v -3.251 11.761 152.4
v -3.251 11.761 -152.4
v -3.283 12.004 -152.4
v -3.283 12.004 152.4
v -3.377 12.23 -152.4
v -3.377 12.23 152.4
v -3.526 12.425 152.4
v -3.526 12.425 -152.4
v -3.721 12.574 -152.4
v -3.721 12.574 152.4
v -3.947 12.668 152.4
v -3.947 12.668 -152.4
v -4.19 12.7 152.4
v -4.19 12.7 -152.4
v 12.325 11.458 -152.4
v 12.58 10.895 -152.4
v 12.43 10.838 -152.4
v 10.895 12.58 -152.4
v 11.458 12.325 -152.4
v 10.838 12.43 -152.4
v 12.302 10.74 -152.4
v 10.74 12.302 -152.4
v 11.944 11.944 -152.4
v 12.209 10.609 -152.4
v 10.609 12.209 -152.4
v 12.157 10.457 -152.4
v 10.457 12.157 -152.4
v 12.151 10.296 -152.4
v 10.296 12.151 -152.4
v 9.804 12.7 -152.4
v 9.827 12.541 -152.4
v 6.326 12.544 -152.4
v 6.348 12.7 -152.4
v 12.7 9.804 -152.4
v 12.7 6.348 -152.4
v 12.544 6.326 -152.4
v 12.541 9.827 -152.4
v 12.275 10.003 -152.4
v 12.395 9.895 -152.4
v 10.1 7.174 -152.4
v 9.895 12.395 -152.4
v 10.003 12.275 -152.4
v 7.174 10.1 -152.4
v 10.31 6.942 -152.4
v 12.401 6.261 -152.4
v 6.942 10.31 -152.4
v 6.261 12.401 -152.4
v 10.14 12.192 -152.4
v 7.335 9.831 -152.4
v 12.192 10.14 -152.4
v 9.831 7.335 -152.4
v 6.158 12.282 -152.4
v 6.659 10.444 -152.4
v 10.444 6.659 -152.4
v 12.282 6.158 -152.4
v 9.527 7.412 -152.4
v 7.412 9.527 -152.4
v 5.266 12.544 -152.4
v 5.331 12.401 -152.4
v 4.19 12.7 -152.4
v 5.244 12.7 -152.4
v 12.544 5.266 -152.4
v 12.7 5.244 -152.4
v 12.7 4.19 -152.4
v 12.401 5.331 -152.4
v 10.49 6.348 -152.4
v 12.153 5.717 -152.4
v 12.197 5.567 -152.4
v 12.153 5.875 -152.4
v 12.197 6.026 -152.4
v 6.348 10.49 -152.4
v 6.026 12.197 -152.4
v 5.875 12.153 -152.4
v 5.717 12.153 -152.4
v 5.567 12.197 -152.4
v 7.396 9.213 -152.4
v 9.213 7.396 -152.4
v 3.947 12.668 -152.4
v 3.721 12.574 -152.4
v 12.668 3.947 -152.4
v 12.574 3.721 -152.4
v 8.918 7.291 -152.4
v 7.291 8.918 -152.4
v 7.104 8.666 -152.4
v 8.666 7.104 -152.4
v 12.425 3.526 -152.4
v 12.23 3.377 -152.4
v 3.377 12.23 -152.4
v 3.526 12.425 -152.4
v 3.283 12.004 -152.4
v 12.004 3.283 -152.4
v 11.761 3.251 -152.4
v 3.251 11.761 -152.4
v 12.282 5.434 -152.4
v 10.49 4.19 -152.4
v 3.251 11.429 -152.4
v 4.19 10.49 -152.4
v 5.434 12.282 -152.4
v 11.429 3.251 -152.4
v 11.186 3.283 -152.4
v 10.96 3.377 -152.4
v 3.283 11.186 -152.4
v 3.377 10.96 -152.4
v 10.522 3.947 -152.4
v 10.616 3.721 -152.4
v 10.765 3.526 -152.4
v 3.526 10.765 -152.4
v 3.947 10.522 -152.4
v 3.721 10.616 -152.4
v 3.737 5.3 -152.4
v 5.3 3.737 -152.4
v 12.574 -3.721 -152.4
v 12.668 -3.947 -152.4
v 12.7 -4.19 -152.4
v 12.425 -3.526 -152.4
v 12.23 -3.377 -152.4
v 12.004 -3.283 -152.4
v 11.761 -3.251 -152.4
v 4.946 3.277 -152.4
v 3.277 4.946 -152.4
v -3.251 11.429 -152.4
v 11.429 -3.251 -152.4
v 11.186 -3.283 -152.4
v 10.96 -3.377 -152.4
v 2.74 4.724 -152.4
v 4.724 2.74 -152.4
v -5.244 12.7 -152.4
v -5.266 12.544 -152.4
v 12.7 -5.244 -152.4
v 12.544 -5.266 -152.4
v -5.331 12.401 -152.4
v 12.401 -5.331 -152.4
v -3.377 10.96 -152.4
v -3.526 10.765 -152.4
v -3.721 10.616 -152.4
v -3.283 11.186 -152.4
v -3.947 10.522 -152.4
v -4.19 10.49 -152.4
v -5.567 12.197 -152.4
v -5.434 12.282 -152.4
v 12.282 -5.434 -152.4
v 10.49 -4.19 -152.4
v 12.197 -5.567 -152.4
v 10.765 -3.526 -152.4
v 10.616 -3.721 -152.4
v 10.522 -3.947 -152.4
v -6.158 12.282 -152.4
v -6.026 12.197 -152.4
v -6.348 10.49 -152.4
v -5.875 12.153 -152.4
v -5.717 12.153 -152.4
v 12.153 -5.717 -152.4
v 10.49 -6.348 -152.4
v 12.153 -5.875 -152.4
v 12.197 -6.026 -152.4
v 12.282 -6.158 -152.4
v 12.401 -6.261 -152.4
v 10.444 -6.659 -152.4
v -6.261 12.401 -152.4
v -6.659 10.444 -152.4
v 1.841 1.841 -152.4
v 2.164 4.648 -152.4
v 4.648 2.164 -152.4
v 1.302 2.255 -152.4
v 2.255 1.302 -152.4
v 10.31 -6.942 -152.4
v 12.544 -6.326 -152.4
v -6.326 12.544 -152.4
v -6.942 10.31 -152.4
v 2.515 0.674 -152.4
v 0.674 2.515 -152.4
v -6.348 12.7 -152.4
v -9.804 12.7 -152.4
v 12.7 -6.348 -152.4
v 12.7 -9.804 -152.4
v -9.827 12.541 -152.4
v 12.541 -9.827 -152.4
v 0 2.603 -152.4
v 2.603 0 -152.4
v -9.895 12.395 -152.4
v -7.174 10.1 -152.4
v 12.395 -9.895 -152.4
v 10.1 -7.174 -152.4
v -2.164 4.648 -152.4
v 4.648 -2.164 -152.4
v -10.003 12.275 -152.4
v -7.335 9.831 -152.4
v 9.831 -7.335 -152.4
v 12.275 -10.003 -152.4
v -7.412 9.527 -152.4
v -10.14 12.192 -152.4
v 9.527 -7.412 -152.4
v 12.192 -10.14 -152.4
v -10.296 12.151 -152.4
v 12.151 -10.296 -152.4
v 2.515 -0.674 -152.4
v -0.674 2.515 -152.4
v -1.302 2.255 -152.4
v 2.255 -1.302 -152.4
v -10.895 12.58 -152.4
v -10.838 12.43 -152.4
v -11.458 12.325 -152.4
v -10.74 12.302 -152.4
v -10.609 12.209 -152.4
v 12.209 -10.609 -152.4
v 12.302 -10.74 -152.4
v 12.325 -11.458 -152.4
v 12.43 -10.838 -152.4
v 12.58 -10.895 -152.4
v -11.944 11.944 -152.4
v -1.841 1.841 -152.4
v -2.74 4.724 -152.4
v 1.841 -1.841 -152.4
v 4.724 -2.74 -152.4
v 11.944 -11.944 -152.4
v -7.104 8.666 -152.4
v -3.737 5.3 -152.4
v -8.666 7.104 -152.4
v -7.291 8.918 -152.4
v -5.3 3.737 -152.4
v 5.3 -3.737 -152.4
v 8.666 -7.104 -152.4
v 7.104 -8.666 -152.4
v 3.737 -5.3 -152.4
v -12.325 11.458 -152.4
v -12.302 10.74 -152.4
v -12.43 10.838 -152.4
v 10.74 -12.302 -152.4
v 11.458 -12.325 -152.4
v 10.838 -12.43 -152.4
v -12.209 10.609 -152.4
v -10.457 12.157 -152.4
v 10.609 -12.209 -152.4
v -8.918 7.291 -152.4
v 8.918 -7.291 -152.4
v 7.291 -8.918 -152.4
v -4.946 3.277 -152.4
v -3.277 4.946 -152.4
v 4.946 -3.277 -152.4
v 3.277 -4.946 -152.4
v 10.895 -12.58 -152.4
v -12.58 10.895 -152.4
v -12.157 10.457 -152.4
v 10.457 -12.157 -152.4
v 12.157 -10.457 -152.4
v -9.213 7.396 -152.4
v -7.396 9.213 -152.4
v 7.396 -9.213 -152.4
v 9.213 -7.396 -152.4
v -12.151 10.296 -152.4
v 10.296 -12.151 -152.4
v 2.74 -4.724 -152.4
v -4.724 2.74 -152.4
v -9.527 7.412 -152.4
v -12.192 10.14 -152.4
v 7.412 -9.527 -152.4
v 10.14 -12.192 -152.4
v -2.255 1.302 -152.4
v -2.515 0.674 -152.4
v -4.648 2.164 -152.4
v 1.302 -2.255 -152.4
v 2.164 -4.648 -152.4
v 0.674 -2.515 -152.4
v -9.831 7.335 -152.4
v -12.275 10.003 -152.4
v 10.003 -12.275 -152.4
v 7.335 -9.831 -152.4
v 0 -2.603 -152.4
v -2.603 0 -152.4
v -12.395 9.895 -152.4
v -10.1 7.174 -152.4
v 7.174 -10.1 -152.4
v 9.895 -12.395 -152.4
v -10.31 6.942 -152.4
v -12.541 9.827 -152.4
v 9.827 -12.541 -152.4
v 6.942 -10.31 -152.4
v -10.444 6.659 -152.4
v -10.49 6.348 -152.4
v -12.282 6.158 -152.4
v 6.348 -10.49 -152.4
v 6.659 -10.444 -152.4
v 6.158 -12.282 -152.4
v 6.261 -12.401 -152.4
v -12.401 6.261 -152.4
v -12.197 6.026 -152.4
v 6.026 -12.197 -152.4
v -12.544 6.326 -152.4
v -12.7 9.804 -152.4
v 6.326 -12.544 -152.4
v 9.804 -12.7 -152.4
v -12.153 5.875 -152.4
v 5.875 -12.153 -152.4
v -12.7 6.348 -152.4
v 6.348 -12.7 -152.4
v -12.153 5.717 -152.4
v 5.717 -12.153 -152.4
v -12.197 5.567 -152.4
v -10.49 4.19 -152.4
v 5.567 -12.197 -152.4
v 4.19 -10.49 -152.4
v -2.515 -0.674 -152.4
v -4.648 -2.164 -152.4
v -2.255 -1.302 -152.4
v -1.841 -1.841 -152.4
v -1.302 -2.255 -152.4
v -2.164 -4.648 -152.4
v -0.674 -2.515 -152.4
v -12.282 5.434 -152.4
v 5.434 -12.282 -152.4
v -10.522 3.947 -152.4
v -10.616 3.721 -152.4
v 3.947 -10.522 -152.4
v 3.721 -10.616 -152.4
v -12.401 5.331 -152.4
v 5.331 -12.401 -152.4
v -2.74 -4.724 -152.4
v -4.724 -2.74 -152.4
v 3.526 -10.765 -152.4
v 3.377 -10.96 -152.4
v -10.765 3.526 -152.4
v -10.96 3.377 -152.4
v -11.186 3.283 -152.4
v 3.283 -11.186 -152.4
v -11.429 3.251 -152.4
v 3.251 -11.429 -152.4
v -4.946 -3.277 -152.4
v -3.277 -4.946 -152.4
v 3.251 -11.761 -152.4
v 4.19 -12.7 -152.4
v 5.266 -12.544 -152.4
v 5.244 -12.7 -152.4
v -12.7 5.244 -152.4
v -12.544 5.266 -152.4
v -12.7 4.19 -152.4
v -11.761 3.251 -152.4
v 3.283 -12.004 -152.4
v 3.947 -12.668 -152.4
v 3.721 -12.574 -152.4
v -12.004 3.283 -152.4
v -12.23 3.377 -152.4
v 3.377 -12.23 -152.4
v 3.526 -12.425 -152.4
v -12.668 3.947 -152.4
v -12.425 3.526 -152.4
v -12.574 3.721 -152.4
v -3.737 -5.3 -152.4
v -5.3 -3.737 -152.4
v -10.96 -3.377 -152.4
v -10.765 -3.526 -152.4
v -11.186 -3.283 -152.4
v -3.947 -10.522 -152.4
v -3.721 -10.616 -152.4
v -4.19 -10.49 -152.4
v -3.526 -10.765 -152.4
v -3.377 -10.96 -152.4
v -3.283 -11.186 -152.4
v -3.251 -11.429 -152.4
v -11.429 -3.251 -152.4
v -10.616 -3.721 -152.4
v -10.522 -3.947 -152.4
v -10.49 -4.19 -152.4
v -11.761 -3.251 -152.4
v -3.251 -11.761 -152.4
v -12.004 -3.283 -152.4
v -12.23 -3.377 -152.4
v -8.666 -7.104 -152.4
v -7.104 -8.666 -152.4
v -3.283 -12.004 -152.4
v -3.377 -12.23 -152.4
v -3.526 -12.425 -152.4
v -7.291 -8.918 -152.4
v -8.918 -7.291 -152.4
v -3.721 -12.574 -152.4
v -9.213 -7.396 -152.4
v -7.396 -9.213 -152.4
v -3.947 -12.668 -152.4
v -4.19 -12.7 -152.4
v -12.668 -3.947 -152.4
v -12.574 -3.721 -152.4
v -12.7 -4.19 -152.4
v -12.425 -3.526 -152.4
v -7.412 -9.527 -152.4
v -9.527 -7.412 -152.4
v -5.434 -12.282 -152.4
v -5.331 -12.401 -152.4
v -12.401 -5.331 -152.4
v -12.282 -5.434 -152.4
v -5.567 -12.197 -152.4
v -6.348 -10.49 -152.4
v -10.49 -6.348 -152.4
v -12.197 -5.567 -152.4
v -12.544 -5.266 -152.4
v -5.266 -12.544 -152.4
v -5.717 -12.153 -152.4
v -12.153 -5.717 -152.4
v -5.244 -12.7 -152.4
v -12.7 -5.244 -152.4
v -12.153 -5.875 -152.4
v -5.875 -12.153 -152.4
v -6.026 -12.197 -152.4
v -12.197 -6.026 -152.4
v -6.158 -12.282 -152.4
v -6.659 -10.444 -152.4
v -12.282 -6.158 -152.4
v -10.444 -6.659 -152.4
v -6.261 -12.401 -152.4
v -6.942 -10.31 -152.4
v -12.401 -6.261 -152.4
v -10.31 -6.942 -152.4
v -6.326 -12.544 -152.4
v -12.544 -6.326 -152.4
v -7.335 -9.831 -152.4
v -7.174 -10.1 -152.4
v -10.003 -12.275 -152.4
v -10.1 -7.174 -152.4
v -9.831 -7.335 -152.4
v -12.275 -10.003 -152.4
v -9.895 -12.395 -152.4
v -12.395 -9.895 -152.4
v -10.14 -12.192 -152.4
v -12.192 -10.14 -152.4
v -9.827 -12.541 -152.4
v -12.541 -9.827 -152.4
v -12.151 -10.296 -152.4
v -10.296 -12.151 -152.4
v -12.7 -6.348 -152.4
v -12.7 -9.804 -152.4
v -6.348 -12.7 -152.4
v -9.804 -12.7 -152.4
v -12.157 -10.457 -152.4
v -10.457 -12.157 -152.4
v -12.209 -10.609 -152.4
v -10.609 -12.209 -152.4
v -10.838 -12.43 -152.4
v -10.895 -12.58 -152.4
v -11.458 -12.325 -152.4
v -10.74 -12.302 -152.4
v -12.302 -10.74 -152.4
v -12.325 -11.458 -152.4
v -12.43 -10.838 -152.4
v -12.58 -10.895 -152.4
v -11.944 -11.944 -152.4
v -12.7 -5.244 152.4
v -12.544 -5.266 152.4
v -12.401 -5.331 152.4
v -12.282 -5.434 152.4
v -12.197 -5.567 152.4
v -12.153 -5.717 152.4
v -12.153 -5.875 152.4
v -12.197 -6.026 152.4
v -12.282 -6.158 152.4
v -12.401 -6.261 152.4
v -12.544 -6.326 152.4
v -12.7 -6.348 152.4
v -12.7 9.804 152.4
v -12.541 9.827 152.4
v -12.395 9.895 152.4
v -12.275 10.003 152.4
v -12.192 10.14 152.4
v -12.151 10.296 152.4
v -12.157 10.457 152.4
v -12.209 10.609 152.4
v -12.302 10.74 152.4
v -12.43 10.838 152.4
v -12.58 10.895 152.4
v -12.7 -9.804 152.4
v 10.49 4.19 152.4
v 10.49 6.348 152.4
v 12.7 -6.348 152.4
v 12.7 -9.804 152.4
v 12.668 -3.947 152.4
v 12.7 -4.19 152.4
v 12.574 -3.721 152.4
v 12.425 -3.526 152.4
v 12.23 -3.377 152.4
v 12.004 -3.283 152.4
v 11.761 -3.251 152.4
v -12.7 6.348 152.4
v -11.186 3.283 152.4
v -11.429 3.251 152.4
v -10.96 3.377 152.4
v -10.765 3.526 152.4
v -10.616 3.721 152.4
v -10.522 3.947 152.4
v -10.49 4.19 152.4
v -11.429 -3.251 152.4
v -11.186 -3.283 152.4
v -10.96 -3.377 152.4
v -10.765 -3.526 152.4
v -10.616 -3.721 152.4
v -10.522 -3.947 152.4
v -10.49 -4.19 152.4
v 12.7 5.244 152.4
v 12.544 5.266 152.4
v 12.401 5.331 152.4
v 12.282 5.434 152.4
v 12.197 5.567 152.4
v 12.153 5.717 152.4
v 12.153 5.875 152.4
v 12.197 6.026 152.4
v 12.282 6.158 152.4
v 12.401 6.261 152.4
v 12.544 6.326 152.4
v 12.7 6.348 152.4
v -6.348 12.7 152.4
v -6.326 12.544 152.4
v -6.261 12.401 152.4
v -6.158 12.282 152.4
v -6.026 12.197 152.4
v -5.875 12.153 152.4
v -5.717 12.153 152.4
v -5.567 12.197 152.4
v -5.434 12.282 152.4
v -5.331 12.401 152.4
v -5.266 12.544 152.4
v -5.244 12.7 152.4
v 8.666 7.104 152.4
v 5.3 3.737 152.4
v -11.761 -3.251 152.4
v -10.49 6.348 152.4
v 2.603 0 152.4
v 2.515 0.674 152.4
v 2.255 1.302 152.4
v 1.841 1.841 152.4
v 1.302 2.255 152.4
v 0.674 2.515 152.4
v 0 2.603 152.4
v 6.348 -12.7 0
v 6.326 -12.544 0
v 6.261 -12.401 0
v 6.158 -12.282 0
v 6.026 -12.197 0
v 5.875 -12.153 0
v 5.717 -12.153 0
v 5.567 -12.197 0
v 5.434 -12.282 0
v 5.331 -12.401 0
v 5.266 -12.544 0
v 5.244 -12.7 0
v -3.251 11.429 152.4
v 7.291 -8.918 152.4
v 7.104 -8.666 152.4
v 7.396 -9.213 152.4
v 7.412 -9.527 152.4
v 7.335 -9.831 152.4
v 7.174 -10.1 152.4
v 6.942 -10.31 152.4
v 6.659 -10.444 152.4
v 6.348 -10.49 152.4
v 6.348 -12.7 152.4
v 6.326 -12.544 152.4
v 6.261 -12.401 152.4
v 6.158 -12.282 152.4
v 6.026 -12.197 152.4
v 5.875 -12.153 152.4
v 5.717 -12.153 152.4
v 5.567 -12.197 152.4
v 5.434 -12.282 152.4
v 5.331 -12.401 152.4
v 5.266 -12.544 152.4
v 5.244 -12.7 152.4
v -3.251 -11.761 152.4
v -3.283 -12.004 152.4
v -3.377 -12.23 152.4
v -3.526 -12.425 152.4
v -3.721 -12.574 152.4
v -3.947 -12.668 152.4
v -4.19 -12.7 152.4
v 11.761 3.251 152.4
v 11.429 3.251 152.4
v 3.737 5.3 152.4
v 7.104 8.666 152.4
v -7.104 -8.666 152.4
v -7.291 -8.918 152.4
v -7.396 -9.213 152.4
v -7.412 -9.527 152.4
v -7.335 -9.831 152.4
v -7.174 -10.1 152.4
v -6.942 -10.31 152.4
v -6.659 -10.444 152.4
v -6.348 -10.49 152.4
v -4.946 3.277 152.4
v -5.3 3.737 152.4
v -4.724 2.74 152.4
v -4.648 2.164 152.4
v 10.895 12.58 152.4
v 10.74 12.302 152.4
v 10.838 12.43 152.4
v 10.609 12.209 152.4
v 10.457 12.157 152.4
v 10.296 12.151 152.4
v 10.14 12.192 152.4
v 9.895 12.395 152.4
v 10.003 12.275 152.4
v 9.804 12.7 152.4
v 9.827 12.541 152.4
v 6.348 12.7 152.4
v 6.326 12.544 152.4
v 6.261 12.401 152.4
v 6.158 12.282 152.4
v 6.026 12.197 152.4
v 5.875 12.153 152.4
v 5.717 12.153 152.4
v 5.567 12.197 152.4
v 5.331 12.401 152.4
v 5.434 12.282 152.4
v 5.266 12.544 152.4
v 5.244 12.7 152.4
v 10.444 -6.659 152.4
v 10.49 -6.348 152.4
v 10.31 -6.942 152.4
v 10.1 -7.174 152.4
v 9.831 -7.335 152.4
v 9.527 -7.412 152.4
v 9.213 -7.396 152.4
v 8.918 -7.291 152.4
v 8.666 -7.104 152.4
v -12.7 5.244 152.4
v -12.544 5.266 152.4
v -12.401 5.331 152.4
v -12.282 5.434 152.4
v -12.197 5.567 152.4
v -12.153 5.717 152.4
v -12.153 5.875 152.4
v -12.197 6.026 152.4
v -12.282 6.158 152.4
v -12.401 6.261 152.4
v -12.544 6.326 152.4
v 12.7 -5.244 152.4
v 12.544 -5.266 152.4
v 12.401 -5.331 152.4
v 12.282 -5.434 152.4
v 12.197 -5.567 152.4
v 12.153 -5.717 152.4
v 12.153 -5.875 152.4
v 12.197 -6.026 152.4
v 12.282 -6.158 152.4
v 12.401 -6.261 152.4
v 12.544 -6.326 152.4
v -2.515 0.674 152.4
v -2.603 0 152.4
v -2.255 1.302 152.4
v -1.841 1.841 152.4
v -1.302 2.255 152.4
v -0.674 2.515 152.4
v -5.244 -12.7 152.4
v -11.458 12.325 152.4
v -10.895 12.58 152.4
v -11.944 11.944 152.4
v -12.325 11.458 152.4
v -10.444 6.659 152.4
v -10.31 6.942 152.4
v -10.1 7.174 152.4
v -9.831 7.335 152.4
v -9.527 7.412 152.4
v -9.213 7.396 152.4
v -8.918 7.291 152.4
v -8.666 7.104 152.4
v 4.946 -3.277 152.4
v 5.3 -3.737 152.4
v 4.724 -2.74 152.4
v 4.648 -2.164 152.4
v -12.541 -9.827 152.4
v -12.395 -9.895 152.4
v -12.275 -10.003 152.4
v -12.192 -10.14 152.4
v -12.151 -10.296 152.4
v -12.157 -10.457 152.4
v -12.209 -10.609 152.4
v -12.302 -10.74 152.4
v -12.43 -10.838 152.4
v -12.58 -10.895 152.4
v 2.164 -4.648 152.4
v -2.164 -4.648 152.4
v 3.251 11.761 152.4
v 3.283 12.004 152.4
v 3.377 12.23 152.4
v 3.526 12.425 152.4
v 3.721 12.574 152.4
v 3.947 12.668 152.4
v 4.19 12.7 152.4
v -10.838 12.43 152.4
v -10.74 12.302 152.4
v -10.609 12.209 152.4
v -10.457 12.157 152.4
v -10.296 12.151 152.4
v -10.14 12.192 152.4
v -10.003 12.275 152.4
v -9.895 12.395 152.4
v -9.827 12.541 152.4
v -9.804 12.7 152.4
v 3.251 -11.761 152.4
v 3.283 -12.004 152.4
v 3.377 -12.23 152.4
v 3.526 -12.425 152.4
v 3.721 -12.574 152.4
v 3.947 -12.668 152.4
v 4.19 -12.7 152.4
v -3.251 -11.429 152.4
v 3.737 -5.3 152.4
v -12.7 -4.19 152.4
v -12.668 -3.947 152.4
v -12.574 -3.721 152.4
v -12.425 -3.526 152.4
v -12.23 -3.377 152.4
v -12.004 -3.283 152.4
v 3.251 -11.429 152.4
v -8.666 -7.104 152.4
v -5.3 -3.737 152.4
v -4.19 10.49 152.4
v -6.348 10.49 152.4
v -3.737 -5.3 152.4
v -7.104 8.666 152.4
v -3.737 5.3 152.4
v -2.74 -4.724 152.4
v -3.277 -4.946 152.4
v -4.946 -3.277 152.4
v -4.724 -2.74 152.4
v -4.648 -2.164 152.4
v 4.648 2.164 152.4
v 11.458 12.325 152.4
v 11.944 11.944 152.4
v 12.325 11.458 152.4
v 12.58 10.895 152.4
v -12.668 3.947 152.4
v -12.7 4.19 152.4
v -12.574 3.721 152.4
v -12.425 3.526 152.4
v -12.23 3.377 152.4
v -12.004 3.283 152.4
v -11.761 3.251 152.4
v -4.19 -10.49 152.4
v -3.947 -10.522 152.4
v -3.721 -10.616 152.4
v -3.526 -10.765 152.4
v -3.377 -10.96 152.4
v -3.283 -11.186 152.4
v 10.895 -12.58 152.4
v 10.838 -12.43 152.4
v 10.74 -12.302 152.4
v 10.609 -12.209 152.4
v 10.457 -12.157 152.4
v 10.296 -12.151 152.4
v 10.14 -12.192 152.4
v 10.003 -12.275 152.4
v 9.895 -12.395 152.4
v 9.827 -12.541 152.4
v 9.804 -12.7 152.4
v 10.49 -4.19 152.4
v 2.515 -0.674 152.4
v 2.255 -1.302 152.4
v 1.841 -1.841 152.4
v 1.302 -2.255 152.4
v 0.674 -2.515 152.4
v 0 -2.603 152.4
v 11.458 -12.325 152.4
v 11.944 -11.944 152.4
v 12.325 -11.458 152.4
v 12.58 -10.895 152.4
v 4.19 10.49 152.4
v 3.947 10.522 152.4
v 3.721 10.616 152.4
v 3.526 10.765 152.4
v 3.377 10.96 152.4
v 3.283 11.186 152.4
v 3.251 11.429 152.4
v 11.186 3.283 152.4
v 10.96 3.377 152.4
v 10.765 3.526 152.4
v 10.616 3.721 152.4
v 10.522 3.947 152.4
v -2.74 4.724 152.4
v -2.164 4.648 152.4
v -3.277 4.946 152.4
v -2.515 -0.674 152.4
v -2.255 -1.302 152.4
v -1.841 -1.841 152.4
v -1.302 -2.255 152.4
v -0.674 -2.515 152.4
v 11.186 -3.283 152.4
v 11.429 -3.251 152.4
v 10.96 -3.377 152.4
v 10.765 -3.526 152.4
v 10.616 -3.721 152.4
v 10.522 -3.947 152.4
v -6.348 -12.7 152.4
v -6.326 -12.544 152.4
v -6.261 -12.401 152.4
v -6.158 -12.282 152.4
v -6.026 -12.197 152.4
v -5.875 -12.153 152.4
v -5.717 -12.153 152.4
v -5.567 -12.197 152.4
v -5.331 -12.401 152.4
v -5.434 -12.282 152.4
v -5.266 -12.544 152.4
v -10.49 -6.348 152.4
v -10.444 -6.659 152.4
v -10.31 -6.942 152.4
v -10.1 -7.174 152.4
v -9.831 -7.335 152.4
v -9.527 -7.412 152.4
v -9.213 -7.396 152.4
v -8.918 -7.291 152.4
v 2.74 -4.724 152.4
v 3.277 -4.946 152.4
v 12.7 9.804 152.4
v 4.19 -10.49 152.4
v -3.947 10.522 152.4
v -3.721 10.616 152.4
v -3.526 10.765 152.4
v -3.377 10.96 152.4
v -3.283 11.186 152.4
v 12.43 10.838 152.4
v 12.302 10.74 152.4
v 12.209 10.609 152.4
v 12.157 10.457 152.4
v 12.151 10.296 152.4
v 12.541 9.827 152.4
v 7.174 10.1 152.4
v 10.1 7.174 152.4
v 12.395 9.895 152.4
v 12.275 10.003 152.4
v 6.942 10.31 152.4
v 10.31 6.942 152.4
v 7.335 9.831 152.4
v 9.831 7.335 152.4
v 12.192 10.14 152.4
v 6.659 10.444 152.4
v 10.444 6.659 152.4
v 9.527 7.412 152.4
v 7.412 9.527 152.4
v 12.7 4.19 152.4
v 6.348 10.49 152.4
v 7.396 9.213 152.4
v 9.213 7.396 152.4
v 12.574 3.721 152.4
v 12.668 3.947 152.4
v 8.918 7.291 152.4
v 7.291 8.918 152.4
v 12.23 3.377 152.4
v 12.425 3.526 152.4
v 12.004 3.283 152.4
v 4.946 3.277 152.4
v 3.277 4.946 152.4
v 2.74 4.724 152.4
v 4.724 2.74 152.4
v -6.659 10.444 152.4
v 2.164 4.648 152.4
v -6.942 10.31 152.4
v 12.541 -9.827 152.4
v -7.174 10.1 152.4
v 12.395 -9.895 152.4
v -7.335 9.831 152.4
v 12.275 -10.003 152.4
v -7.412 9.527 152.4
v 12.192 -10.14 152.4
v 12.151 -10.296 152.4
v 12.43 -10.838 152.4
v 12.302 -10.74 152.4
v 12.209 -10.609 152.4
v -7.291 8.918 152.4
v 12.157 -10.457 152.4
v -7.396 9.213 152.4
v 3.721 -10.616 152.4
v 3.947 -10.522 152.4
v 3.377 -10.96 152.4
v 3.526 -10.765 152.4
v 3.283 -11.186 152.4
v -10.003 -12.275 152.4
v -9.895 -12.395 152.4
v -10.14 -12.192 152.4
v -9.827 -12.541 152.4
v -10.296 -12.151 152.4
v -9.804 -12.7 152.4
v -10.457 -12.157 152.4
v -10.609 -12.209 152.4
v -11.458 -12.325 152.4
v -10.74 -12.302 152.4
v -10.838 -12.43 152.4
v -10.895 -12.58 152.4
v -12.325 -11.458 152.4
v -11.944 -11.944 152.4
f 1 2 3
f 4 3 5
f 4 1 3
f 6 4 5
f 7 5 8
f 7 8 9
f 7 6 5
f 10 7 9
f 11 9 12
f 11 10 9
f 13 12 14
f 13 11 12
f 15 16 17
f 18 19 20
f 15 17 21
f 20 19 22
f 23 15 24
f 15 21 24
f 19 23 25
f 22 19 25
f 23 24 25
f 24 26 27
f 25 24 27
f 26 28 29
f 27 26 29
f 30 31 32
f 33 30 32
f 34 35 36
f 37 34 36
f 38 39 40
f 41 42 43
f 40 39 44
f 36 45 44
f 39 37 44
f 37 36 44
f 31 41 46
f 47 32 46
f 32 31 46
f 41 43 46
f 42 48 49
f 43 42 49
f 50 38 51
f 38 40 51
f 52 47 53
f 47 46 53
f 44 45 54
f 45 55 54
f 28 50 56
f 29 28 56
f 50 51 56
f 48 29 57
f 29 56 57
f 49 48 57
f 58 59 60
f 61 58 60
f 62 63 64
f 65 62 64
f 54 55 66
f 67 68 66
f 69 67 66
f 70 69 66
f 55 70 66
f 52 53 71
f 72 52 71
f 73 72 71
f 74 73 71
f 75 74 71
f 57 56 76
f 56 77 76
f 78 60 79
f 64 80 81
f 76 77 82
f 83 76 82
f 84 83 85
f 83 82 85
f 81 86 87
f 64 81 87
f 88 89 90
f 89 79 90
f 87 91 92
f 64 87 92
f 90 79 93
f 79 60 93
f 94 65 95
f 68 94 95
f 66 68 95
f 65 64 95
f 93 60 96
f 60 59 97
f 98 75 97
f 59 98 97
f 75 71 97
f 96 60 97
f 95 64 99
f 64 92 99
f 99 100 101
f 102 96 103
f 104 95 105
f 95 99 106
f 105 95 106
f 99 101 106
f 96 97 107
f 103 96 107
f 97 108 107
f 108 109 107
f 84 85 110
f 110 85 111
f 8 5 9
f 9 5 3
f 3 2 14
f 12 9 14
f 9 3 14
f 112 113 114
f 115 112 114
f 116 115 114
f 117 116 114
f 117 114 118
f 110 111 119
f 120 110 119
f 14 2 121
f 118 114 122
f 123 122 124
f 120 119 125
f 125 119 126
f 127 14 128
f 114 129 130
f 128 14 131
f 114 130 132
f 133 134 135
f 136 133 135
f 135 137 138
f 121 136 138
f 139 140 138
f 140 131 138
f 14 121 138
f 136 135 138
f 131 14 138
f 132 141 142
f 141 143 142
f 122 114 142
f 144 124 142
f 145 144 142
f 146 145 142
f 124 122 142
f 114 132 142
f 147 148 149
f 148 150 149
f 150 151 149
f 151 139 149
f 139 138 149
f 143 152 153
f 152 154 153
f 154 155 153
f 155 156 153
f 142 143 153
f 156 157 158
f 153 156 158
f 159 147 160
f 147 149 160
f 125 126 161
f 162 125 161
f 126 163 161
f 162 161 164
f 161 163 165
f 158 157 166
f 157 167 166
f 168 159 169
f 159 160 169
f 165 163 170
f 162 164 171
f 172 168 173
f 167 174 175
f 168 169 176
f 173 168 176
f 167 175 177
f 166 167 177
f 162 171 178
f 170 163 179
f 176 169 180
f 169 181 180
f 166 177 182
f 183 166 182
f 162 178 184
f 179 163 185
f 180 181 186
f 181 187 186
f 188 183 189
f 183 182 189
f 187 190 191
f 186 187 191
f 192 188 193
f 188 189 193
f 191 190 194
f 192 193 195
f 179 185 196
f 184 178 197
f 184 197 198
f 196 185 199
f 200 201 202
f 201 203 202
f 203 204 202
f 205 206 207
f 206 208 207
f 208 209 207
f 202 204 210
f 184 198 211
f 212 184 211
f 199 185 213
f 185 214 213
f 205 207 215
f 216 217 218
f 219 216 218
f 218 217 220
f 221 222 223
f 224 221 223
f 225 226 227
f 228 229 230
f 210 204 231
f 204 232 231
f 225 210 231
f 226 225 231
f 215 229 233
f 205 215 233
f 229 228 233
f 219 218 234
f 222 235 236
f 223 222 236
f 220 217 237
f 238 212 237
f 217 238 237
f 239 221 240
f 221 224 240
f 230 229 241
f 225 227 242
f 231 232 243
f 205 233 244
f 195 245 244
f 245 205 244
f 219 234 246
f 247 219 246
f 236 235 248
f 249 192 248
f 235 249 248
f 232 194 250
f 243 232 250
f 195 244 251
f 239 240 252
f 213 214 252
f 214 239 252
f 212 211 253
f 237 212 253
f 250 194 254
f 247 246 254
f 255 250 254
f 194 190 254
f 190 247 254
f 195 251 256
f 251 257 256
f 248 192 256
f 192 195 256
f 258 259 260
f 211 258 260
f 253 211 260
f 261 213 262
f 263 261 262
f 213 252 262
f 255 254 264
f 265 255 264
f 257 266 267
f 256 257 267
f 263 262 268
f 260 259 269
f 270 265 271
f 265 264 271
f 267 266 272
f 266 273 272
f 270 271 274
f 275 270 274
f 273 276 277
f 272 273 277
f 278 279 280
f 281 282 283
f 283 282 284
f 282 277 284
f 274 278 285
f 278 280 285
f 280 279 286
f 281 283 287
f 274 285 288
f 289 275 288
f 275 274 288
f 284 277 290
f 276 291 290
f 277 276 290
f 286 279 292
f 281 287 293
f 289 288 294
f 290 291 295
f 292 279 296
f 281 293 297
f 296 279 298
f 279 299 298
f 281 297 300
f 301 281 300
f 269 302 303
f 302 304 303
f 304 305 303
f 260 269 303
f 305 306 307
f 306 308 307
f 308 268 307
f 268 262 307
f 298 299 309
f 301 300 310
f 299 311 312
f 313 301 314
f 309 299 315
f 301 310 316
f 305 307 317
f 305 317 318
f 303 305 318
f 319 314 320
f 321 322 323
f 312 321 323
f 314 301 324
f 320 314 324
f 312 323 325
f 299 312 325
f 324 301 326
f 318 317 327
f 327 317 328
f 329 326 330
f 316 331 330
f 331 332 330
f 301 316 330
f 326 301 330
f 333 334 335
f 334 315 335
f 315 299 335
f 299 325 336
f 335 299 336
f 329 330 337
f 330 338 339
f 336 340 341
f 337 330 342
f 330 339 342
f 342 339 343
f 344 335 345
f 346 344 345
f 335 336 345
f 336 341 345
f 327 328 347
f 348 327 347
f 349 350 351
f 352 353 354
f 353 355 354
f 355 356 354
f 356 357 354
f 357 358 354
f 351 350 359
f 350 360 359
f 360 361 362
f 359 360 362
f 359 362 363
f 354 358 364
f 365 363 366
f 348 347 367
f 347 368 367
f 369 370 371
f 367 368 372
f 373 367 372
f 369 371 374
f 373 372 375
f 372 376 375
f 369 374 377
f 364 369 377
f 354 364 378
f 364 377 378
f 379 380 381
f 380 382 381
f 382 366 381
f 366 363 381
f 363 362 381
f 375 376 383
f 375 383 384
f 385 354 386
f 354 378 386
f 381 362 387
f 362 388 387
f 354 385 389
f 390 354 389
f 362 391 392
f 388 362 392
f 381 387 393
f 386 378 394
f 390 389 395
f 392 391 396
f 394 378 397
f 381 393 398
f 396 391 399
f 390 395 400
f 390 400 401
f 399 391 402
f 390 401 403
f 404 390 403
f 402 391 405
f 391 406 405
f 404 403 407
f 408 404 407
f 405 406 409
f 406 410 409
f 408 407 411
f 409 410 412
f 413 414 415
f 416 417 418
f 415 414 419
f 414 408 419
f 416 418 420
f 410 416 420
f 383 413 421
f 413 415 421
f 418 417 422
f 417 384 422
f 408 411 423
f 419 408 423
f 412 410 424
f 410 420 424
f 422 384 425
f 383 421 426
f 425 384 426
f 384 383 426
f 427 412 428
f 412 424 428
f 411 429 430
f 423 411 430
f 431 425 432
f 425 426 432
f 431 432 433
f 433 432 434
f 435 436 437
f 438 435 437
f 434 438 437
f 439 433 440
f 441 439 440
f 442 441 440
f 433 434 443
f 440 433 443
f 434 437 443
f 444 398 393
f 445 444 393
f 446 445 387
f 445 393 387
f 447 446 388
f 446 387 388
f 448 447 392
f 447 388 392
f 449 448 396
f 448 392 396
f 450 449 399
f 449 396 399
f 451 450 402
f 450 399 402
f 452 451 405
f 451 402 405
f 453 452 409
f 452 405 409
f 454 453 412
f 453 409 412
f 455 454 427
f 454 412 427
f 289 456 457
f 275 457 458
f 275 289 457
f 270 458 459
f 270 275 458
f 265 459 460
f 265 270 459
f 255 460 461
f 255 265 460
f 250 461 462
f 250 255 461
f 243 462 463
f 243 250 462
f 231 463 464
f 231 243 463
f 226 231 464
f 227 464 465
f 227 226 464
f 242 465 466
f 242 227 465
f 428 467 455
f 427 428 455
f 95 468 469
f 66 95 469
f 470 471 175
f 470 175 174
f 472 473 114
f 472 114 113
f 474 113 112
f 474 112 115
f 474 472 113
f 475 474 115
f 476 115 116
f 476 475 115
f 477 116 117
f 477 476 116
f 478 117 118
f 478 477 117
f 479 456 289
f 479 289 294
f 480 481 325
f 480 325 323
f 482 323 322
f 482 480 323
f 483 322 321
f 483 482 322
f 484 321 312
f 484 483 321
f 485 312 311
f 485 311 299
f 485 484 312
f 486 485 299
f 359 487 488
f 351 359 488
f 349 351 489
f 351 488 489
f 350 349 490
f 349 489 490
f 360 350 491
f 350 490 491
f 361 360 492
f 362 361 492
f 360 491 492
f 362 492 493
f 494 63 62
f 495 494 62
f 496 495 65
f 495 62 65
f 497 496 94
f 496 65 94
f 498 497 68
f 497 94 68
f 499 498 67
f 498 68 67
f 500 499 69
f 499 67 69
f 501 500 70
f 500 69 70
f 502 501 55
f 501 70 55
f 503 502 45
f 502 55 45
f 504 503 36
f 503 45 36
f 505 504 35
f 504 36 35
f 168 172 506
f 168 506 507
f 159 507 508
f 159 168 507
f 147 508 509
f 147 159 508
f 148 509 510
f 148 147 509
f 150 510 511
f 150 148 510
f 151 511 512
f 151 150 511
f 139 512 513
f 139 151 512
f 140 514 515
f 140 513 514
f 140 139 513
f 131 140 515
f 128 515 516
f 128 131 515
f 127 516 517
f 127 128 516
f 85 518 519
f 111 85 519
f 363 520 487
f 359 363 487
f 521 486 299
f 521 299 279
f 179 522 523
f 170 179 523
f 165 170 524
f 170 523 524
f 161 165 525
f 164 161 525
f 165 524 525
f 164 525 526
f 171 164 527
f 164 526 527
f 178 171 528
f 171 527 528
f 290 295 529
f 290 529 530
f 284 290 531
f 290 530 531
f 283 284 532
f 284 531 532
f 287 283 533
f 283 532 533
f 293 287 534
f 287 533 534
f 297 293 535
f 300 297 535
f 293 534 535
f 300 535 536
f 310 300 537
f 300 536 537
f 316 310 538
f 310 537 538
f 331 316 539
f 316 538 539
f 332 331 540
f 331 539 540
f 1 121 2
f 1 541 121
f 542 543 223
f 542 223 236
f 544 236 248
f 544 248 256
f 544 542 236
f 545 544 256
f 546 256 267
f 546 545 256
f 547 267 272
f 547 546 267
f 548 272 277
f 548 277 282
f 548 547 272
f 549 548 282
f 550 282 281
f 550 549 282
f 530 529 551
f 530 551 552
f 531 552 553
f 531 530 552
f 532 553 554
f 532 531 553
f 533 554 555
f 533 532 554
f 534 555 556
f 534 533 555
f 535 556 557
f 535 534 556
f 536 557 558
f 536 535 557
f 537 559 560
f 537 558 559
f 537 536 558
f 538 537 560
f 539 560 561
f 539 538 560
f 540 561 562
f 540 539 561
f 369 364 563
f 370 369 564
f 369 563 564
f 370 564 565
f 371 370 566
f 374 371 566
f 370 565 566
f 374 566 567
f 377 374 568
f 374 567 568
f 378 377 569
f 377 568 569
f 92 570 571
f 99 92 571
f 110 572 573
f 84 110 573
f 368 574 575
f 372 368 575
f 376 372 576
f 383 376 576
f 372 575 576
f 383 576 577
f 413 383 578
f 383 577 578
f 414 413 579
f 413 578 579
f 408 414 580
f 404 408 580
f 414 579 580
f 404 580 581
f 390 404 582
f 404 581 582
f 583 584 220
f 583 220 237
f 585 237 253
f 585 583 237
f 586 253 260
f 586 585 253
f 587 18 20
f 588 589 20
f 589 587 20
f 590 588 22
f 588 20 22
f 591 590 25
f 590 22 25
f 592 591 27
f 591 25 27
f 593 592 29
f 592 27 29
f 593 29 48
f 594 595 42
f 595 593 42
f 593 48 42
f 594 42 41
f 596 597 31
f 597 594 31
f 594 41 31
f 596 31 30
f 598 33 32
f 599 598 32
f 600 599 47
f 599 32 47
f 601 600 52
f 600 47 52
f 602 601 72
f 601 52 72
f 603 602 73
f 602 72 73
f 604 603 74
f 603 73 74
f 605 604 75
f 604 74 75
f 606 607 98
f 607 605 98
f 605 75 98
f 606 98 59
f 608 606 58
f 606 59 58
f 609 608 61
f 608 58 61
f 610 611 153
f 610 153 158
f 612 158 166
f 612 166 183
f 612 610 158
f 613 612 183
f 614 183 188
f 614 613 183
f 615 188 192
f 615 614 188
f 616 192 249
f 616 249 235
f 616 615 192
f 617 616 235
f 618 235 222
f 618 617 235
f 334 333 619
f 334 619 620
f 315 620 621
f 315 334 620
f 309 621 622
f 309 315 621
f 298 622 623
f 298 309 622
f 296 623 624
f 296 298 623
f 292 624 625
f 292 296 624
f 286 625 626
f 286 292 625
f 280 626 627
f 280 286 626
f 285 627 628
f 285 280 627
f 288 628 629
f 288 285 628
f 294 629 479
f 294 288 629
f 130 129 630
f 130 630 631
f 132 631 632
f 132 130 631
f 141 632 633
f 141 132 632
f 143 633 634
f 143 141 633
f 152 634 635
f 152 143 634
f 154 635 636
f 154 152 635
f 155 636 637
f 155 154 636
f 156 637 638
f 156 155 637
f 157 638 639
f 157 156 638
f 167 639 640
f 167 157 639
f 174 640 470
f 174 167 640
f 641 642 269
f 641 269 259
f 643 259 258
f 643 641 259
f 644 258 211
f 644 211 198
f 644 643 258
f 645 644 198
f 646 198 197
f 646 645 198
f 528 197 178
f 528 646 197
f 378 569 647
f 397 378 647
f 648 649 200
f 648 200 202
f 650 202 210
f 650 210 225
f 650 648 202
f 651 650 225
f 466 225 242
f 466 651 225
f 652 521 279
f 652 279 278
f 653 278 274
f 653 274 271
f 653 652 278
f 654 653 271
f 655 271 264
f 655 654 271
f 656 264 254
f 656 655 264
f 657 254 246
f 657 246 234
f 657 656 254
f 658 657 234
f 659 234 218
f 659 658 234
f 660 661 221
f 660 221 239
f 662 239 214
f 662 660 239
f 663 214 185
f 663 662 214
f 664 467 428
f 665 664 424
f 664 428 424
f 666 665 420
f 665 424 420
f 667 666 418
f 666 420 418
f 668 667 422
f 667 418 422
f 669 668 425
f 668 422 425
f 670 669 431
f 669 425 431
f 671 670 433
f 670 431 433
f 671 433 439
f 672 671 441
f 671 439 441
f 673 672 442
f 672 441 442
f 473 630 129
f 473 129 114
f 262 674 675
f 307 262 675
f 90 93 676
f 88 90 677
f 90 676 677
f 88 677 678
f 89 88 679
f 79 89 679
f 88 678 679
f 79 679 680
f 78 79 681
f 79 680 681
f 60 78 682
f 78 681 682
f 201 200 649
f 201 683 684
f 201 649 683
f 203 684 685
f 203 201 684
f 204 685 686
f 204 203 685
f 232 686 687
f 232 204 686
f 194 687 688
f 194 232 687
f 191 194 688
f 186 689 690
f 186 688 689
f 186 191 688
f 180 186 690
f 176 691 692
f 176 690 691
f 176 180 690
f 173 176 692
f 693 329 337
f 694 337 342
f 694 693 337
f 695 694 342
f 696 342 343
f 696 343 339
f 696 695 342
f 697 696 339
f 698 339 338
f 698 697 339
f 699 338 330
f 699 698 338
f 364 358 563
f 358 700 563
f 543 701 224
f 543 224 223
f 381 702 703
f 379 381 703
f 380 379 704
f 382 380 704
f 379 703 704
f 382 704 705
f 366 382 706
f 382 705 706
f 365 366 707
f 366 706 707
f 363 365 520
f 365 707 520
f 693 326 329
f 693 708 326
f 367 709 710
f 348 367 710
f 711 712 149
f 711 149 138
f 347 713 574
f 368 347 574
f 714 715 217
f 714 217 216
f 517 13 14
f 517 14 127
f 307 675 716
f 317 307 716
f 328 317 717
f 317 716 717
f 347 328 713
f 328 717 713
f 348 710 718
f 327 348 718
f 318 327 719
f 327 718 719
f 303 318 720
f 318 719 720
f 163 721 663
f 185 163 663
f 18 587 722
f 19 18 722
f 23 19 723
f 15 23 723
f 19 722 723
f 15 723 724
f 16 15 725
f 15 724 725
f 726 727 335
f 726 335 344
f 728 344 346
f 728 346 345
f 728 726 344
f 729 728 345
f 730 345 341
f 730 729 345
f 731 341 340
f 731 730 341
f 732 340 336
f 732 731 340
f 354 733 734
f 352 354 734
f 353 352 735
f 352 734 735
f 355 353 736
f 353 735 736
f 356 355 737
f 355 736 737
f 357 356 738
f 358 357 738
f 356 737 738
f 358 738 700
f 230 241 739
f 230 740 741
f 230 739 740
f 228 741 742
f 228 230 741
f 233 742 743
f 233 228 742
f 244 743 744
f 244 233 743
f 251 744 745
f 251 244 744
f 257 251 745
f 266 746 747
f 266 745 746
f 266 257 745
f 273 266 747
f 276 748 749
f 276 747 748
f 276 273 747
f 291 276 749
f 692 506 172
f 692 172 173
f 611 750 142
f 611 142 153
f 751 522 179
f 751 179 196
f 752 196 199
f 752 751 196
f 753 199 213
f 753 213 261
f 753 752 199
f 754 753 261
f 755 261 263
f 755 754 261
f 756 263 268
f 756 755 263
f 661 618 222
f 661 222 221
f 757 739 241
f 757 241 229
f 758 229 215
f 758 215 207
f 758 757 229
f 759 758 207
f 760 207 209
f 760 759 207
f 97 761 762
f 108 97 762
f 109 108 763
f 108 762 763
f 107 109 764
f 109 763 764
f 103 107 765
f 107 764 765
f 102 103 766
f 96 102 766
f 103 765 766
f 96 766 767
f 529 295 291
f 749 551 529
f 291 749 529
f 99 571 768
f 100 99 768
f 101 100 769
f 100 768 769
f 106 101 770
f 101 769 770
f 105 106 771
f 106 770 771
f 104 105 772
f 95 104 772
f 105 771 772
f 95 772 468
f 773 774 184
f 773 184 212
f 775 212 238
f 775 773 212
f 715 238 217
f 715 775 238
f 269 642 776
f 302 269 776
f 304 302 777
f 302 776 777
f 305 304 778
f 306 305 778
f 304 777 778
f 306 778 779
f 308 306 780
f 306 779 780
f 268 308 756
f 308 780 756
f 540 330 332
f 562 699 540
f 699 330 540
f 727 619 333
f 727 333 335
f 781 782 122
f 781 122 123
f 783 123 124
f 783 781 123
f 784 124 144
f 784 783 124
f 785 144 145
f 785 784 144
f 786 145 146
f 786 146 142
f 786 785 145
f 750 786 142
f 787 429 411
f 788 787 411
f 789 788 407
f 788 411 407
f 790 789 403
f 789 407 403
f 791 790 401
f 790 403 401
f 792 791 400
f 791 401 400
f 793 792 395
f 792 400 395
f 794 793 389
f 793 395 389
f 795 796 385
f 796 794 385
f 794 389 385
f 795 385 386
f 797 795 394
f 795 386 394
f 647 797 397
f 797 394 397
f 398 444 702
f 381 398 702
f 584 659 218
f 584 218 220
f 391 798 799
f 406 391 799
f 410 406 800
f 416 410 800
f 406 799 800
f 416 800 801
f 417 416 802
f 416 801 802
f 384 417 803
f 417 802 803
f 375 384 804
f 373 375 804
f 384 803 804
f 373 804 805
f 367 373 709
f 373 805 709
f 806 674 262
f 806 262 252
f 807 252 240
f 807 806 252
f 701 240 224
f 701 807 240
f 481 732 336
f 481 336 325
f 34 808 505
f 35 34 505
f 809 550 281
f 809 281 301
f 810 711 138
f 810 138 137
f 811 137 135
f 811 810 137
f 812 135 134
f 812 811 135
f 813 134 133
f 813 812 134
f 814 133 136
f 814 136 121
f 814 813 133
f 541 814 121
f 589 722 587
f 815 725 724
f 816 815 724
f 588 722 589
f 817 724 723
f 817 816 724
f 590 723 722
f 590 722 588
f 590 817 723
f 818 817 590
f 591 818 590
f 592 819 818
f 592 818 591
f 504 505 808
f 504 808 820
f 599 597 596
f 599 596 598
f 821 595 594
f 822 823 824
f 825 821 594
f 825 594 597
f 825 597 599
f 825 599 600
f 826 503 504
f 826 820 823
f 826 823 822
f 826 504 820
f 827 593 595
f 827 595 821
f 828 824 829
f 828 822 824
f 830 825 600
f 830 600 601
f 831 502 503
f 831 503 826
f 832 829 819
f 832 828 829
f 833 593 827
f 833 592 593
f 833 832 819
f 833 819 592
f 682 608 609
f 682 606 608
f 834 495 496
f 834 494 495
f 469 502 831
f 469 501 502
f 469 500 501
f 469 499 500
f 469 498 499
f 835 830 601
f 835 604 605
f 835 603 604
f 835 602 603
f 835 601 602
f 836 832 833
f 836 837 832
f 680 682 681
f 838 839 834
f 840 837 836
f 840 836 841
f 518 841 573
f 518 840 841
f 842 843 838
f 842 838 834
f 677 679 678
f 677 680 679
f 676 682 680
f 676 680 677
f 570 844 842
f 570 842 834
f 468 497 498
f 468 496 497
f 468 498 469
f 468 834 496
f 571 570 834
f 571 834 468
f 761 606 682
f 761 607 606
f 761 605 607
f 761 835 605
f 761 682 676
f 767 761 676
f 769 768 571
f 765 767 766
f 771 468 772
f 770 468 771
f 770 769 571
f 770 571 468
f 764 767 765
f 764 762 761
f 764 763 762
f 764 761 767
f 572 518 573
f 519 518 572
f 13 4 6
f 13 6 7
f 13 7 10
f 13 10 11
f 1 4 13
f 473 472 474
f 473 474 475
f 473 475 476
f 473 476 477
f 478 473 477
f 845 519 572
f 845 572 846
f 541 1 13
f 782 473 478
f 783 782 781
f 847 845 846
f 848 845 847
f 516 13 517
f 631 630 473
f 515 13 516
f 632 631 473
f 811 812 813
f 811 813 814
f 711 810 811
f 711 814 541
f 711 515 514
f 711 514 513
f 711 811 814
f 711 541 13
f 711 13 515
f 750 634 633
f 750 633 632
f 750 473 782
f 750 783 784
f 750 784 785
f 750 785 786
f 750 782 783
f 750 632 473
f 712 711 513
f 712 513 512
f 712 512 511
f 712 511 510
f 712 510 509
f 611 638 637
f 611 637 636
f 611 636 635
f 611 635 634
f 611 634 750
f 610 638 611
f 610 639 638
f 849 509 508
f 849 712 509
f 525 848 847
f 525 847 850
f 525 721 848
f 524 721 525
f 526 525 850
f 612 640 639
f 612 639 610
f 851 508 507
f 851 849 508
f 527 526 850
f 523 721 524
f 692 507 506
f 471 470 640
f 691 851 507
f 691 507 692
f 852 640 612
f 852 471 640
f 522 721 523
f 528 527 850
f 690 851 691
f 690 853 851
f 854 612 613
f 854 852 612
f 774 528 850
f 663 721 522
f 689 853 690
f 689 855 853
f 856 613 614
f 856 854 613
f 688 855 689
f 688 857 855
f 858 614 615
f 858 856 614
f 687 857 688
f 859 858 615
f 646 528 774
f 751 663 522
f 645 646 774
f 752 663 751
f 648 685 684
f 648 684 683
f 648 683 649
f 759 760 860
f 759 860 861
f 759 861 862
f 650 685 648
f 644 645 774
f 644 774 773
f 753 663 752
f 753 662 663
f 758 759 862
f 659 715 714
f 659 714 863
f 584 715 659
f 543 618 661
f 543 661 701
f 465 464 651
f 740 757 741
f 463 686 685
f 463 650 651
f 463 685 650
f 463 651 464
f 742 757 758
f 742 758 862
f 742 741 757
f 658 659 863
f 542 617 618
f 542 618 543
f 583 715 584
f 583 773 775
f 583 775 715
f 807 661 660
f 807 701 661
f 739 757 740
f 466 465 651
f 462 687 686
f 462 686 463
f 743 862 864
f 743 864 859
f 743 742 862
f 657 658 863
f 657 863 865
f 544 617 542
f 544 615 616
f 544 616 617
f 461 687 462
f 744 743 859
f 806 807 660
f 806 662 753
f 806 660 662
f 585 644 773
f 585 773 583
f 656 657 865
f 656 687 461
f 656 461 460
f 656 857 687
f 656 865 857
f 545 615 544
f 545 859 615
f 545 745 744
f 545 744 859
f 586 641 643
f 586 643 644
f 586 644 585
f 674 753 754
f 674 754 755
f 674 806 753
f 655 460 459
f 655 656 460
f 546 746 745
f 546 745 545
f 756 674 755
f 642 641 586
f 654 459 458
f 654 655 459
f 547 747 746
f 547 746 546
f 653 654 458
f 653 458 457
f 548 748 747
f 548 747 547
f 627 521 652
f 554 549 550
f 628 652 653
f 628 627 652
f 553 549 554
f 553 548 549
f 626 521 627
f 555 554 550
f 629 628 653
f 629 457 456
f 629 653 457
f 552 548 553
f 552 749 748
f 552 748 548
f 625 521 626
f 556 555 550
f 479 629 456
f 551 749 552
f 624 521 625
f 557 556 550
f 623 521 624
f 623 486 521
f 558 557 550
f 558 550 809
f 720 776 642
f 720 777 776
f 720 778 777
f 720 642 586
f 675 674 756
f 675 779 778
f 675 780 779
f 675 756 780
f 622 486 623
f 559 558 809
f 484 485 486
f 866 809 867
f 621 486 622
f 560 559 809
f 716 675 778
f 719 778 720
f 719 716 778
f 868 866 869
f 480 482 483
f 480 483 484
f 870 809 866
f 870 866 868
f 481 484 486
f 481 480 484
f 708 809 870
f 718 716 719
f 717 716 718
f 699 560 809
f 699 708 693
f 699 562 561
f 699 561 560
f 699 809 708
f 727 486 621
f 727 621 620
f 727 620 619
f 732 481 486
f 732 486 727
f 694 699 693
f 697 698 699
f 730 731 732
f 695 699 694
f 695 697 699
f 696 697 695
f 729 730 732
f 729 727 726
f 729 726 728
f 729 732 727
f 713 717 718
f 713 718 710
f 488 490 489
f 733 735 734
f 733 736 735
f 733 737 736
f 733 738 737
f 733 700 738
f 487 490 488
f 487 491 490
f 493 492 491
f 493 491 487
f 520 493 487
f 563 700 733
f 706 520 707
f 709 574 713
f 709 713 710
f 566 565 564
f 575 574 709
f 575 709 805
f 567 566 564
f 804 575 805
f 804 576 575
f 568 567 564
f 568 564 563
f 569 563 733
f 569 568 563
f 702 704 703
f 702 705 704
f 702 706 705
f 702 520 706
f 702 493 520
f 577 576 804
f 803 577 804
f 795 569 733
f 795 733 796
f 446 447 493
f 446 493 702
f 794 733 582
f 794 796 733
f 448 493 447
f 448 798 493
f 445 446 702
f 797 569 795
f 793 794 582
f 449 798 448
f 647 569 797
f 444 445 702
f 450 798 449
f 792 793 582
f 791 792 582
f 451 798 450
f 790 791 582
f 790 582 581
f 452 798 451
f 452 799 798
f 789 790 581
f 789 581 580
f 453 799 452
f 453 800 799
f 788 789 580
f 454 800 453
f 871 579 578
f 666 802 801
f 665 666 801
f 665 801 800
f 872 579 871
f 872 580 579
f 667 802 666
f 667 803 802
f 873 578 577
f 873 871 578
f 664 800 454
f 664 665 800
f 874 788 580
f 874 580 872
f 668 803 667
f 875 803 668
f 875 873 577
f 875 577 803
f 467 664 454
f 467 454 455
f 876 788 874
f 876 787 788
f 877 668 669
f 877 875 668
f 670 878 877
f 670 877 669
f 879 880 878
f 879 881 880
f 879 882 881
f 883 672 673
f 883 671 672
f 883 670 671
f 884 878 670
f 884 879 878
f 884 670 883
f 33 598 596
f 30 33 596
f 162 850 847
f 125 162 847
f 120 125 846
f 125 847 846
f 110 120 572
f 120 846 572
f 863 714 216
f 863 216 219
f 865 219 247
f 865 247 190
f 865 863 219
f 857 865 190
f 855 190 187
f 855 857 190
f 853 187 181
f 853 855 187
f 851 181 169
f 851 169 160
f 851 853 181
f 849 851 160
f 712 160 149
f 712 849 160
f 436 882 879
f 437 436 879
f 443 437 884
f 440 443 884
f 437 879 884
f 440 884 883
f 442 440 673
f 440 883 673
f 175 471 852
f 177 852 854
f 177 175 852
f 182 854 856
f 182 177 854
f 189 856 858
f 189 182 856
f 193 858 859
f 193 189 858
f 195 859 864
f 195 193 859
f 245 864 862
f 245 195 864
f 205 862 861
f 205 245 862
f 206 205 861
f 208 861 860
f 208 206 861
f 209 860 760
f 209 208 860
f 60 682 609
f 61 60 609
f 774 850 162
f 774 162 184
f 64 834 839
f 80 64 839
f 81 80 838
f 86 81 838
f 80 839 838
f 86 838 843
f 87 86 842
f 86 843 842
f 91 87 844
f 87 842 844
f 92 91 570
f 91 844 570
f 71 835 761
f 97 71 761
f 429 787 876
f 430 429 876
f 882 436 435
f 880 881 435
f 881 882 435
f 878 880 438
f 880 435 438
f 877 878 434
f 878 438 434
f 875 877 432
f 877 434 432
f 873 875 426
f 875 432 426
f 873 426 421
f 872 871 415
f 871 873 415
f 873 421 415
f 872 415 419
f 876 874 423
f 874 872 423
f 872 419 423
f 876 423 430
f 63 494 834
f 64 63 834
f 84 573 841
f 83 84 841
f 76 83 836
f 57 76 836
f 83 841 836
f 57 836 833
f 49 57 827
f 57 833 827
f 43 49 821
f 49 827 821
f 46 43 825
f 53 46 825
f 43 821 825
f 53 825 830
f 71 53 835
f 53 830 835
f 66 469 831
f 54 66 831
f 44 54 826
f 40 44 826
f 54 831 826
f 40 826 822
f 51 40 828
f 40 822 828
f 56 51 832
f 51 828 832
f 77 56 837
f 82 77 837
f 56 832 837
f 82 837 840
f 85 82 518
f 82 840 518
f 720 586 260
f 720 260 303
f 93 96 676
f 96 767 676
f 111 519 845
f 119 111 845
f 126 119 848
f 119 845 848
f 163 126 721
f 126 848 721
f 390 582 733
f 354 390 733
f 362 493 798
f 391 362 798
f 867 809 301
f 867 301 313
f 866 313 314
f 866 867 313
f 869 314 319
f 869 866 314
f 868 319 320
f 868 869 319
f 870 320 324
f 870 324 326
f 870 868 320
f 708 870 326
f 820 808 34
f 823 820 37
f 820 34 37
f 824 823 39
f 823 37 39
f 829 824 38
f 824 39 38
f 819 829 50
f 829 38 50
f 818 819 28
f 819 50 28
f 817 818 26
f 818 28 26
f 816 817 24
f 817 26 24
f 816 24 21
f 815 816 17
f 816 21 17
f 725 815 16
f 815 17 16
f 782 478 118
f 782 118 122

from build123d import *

# Parameters (mm, degrees)
BOSS_EXTRUDE1_DEPTH     = 152.4
SKETCH5_R               = 0.55245
CUT_EXTRUDE1_DEPTH      = 153.4
CUT_EXTRUDE1_DEPTH_BACK = 153.4


with BuildPart() as part:
    # Sketch4 → Boss-Extrude1 (new body, symmetric)
    with BuildSketch(Plane.XY):
        with BuildLine():
            Line((4.190365, -12.7), (10.11729625, -12.7))
            ThreePointArc((10.11729625, -12.7), (11.943543585, -11.943543585), (12.7, -10.11729625))
            Line((12.7, -10.11729625), (12.7, -4.190365))
            ThreePointArc((12.7, -4.190365), (12.42492494, -3.52627506), (11.760835, -3.2512))
            Line((11.760835, -3.2512), (11.429365, -3.2512))
            ThreePointArc((11.429365, -3.2512), (10.76527506, -3.52627506), (10.4902, -4.190365))
            Line((10.4902, -4.190365), (10.4902, -6.348478019))
            ThreePointArc((10.4902, -6.348478019), (9.830707141, -7.335478831), (8.666460301, -7.103895736))
            Line((8.666460301, -7.103895736), (5.299899128, -3.737334563))
            ThreePointArc((5.299899128, -3.737334563), (4.817571085, -3.015479634), (4.6482, -2.16399369))
            Line((4.6482, -2.16399369), (4.6482, 0))
            Line((4.6482, 0), (2.6035, 0))
            ThreePointArc((2.6035, 0), (1.840952505, -1.840952505), (0, -2.6035))
            Line((0, -2.6035), (0, -4.6482))
            Line((0, -4.6482), (2.16399369, -4.6482))
            ThreePointArc((2.16399369, -4.6482), (3.015479634, -4.817571085), (3.737334563, -5.299899128))
            Line((3.737334563, -5.299899128), (7.103895736, -8.666460301))
            ThreePointArc((7.103895736, -8.666460301), (7.335478831, -9.830707141), (6.348478019, -10.4902))
            Line((6.348478019, -10.4902), (4.190365, -10.4902))
            ThreePointArc((4.190365, -10.4902), (3.52627506, -10.76527506), (3.2512, -11.429365))
            Line((3.2512, -11.429365), (3.2512, -11.760835))
            ThreePointArc((3.2512, -11.760835), (3.52627506, -12.42492494), (4.190365, -12.7))
        make_face()
    extrude(amount=BOSS_EXTRUDE1_DEPTH, both=True)

    # Sketch5 → Cut-Extrude1 (cut, two sides)
    with BuildSketch(Plane.XY) as cut_extrude1_sk:
        with Locations((10.356153152, -12.7)):
            Circle(SKETCH5_R)
        with Locations((5.796028019, -12.7)):
            Circle(SKETCH5_R)
        with Locations((12.7, -10.356153152)):
            Circle(SKETCH5_R)
        with Locations((12.7, -5.796028019)):
            Circle(SKETCH5_R)
    extrude(amount=CUT_EXTRUDE1_DEPTH, mode=Mode.SUBTRACT)
    extrude(cut_extrude1_sk.sketch, amount=-CUT_EXTRUDE1_DEPTH_BACK, mode=Mode.SUBTRACT)

    # Mirror1: part across plane


with BuildPart() as part_1:
    add(part.part)
    add(part.part.mirror(Plane(origin=(0, 0, 0), x_dir=(0, 0, 1), z_dir=(1, 0, 0))))

    # Mirror2: part across plane


with BuildPart() as part_2:
    add(part_1.part)
    add(part_1.part.mirror(Plane.ZX))


solid = part_2.part
